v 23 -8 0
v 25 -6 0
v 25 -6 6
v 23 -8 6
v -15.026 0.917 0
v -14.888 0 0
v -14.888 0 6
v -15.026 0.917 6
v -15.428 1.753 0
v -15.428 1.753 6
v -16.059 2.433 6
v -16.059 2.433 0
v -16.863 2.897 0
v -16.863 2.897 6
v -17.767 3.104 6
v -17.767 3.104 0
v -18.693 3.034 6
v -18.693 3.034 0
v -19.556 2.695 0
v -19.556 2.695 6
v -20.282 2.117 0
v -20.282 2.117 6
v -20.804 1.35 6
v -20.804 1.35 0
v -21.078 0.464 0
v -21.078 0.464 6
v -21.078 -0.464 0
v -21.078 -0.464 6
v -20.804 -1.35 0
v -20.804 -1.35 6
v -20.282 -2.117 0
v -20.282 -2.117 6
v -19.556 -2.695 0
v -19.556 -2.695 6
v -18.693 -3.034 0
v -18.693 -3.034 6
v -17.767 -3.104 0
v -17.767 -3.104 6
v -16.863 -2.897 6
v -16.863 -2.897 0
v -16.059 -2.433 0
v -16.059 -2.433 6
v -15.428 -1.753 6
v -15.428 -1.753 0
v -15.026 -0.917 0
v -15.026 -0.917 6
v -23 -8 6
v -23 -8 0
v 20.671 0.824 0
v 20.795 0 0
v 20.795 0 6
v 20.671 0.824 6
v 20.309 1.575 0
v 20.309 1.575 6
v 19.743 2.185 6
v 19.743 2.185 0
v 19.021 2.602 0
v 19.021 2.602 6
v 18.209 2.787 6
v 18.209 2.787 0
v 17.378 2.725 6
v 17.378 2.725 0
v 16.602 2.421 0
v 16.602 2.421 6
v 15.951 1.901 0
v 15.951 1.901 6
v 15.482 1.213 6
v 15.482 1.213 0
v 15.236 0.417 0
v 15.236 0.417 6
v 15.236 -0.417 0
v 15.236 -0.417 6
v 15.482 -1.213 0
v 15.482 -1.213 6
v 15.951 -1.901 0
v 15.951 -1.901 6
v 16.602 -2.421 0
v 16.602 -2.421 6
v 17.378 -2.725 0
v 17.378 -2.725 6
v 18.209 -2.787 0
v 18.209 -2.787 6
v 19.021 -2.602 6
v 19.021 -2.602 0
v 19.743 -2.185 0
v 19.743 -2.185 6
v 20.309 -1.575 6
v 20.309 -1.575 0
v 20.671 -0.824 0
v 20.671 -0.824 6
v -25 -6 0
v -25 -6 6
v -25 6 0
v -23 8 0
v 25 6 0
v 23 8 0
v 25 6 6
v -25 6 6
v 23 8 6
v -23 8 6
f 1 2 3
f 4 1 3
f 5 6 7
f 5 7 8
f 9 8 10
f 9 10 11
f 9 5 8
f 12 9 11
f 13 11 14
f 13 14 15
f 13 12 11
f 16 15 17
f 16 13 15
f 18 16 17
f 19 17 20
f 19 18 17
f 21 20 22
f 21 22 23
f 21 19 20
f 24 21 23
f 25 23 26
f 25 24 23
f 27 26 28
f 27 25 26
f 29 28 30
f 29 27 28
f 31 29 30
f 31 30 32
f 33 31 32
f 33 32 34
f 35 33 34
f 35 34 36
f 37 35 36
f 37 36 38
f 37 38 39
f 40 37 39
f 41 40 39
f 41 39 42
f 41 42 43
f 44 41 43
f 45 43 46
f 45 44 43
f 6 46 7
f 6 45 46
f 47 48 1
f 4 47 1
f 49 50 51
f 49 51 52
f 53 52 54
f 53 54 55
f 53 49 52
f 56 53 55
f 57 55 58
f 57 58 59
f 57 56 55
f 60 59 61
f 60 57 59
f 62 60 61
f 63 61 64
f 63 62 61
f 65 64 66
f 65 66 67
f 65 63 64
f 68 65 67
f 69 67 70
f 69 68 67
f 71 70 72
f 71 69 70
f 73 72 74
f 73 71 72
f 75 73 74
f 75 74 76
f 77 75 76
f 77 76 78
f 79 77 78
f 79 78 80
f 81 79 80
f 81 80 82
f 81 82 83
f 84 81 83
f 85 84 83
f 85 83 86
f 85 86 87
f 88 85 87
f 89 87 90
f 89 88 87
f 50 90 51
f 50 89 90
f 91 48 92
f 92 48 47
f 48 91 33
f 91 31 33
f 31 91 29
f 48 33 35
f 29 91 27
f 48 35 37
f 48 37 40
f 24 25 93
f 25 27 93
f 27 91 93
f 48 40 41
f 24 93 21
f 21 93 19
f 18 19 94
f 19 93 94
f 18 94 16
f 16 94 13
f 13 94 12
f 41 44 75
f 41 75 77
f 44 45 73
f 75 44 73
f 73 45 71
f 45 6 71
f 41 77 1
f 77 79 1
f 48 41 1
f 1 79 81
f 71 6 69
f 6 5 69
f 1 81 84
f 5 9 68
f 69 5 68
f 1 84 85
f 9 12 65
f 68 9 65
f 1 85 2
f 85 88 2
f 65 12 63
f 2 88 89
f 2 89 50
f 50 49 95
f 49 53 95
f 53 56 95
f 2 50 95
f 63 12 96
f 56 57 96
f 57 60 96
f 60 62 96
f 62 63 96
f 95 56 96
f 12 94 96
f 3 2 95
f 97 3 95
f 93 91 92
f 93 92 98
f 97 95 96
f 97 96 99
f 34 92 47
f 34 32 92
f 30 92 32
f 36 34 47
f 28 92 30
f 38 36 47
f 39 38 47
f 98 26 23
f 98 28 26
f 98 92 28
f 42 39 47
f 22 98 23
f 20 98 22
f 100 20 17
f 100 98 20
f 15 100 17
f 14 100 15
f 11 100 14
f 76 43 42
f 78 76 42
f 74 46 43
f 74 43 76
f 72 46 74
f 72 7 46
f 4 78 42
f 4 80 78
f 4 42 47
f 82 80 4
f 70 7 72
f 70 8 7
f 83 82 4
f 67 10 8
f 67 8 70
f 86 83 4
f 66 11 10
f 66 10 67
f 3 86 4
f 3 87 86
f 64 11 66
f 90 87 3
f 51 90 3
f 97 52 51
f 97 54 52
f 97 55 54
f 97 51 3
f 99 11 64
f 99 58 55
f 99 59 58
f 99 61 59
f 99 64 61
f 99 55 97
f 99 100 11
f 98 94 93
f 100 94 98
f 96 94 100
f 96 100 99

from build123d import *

# Parameters (mm, degrees)
SKETCH1_W           = 50
SKETCH1_H           = 16
SKETCH1_R           = 3.112420157
SKETCH1_R_2         = 2.795165179
BOSS_EXTRUDE1_DEPTH = 6
CHAMFER1_SIZE       = 2


with BuildPart() as part:
    # Sketch1 → Boss-Extrude1 (new body)
    with BuildSketch(Plane.XY):
        Rectangle(SKETCH1_W, SKETCH1_H)
        with Locations((-18, 0)):
            Circle(SKETCH1_R, mode=Mode.SUBTRACT)
        with Locations((18, 0)):
            Circle(SKETCH1_R_2, mode=Mode.SUBTRACT)
    extrude(amount=BOSS_EXTRUDE1_DEPTH)

    # Chamfer1
    chamfer1_edges = [part.edges().sort_by_distance(p)[0] for p in [
        (25, -8, 3),
        (-25, -8, 3),
        (-25, 8, 3),
        (25, 8, 3),
    ]]
    chamfer(chamfer1_edges, length=CHAMFER1_SIZE)


solid = part.part
